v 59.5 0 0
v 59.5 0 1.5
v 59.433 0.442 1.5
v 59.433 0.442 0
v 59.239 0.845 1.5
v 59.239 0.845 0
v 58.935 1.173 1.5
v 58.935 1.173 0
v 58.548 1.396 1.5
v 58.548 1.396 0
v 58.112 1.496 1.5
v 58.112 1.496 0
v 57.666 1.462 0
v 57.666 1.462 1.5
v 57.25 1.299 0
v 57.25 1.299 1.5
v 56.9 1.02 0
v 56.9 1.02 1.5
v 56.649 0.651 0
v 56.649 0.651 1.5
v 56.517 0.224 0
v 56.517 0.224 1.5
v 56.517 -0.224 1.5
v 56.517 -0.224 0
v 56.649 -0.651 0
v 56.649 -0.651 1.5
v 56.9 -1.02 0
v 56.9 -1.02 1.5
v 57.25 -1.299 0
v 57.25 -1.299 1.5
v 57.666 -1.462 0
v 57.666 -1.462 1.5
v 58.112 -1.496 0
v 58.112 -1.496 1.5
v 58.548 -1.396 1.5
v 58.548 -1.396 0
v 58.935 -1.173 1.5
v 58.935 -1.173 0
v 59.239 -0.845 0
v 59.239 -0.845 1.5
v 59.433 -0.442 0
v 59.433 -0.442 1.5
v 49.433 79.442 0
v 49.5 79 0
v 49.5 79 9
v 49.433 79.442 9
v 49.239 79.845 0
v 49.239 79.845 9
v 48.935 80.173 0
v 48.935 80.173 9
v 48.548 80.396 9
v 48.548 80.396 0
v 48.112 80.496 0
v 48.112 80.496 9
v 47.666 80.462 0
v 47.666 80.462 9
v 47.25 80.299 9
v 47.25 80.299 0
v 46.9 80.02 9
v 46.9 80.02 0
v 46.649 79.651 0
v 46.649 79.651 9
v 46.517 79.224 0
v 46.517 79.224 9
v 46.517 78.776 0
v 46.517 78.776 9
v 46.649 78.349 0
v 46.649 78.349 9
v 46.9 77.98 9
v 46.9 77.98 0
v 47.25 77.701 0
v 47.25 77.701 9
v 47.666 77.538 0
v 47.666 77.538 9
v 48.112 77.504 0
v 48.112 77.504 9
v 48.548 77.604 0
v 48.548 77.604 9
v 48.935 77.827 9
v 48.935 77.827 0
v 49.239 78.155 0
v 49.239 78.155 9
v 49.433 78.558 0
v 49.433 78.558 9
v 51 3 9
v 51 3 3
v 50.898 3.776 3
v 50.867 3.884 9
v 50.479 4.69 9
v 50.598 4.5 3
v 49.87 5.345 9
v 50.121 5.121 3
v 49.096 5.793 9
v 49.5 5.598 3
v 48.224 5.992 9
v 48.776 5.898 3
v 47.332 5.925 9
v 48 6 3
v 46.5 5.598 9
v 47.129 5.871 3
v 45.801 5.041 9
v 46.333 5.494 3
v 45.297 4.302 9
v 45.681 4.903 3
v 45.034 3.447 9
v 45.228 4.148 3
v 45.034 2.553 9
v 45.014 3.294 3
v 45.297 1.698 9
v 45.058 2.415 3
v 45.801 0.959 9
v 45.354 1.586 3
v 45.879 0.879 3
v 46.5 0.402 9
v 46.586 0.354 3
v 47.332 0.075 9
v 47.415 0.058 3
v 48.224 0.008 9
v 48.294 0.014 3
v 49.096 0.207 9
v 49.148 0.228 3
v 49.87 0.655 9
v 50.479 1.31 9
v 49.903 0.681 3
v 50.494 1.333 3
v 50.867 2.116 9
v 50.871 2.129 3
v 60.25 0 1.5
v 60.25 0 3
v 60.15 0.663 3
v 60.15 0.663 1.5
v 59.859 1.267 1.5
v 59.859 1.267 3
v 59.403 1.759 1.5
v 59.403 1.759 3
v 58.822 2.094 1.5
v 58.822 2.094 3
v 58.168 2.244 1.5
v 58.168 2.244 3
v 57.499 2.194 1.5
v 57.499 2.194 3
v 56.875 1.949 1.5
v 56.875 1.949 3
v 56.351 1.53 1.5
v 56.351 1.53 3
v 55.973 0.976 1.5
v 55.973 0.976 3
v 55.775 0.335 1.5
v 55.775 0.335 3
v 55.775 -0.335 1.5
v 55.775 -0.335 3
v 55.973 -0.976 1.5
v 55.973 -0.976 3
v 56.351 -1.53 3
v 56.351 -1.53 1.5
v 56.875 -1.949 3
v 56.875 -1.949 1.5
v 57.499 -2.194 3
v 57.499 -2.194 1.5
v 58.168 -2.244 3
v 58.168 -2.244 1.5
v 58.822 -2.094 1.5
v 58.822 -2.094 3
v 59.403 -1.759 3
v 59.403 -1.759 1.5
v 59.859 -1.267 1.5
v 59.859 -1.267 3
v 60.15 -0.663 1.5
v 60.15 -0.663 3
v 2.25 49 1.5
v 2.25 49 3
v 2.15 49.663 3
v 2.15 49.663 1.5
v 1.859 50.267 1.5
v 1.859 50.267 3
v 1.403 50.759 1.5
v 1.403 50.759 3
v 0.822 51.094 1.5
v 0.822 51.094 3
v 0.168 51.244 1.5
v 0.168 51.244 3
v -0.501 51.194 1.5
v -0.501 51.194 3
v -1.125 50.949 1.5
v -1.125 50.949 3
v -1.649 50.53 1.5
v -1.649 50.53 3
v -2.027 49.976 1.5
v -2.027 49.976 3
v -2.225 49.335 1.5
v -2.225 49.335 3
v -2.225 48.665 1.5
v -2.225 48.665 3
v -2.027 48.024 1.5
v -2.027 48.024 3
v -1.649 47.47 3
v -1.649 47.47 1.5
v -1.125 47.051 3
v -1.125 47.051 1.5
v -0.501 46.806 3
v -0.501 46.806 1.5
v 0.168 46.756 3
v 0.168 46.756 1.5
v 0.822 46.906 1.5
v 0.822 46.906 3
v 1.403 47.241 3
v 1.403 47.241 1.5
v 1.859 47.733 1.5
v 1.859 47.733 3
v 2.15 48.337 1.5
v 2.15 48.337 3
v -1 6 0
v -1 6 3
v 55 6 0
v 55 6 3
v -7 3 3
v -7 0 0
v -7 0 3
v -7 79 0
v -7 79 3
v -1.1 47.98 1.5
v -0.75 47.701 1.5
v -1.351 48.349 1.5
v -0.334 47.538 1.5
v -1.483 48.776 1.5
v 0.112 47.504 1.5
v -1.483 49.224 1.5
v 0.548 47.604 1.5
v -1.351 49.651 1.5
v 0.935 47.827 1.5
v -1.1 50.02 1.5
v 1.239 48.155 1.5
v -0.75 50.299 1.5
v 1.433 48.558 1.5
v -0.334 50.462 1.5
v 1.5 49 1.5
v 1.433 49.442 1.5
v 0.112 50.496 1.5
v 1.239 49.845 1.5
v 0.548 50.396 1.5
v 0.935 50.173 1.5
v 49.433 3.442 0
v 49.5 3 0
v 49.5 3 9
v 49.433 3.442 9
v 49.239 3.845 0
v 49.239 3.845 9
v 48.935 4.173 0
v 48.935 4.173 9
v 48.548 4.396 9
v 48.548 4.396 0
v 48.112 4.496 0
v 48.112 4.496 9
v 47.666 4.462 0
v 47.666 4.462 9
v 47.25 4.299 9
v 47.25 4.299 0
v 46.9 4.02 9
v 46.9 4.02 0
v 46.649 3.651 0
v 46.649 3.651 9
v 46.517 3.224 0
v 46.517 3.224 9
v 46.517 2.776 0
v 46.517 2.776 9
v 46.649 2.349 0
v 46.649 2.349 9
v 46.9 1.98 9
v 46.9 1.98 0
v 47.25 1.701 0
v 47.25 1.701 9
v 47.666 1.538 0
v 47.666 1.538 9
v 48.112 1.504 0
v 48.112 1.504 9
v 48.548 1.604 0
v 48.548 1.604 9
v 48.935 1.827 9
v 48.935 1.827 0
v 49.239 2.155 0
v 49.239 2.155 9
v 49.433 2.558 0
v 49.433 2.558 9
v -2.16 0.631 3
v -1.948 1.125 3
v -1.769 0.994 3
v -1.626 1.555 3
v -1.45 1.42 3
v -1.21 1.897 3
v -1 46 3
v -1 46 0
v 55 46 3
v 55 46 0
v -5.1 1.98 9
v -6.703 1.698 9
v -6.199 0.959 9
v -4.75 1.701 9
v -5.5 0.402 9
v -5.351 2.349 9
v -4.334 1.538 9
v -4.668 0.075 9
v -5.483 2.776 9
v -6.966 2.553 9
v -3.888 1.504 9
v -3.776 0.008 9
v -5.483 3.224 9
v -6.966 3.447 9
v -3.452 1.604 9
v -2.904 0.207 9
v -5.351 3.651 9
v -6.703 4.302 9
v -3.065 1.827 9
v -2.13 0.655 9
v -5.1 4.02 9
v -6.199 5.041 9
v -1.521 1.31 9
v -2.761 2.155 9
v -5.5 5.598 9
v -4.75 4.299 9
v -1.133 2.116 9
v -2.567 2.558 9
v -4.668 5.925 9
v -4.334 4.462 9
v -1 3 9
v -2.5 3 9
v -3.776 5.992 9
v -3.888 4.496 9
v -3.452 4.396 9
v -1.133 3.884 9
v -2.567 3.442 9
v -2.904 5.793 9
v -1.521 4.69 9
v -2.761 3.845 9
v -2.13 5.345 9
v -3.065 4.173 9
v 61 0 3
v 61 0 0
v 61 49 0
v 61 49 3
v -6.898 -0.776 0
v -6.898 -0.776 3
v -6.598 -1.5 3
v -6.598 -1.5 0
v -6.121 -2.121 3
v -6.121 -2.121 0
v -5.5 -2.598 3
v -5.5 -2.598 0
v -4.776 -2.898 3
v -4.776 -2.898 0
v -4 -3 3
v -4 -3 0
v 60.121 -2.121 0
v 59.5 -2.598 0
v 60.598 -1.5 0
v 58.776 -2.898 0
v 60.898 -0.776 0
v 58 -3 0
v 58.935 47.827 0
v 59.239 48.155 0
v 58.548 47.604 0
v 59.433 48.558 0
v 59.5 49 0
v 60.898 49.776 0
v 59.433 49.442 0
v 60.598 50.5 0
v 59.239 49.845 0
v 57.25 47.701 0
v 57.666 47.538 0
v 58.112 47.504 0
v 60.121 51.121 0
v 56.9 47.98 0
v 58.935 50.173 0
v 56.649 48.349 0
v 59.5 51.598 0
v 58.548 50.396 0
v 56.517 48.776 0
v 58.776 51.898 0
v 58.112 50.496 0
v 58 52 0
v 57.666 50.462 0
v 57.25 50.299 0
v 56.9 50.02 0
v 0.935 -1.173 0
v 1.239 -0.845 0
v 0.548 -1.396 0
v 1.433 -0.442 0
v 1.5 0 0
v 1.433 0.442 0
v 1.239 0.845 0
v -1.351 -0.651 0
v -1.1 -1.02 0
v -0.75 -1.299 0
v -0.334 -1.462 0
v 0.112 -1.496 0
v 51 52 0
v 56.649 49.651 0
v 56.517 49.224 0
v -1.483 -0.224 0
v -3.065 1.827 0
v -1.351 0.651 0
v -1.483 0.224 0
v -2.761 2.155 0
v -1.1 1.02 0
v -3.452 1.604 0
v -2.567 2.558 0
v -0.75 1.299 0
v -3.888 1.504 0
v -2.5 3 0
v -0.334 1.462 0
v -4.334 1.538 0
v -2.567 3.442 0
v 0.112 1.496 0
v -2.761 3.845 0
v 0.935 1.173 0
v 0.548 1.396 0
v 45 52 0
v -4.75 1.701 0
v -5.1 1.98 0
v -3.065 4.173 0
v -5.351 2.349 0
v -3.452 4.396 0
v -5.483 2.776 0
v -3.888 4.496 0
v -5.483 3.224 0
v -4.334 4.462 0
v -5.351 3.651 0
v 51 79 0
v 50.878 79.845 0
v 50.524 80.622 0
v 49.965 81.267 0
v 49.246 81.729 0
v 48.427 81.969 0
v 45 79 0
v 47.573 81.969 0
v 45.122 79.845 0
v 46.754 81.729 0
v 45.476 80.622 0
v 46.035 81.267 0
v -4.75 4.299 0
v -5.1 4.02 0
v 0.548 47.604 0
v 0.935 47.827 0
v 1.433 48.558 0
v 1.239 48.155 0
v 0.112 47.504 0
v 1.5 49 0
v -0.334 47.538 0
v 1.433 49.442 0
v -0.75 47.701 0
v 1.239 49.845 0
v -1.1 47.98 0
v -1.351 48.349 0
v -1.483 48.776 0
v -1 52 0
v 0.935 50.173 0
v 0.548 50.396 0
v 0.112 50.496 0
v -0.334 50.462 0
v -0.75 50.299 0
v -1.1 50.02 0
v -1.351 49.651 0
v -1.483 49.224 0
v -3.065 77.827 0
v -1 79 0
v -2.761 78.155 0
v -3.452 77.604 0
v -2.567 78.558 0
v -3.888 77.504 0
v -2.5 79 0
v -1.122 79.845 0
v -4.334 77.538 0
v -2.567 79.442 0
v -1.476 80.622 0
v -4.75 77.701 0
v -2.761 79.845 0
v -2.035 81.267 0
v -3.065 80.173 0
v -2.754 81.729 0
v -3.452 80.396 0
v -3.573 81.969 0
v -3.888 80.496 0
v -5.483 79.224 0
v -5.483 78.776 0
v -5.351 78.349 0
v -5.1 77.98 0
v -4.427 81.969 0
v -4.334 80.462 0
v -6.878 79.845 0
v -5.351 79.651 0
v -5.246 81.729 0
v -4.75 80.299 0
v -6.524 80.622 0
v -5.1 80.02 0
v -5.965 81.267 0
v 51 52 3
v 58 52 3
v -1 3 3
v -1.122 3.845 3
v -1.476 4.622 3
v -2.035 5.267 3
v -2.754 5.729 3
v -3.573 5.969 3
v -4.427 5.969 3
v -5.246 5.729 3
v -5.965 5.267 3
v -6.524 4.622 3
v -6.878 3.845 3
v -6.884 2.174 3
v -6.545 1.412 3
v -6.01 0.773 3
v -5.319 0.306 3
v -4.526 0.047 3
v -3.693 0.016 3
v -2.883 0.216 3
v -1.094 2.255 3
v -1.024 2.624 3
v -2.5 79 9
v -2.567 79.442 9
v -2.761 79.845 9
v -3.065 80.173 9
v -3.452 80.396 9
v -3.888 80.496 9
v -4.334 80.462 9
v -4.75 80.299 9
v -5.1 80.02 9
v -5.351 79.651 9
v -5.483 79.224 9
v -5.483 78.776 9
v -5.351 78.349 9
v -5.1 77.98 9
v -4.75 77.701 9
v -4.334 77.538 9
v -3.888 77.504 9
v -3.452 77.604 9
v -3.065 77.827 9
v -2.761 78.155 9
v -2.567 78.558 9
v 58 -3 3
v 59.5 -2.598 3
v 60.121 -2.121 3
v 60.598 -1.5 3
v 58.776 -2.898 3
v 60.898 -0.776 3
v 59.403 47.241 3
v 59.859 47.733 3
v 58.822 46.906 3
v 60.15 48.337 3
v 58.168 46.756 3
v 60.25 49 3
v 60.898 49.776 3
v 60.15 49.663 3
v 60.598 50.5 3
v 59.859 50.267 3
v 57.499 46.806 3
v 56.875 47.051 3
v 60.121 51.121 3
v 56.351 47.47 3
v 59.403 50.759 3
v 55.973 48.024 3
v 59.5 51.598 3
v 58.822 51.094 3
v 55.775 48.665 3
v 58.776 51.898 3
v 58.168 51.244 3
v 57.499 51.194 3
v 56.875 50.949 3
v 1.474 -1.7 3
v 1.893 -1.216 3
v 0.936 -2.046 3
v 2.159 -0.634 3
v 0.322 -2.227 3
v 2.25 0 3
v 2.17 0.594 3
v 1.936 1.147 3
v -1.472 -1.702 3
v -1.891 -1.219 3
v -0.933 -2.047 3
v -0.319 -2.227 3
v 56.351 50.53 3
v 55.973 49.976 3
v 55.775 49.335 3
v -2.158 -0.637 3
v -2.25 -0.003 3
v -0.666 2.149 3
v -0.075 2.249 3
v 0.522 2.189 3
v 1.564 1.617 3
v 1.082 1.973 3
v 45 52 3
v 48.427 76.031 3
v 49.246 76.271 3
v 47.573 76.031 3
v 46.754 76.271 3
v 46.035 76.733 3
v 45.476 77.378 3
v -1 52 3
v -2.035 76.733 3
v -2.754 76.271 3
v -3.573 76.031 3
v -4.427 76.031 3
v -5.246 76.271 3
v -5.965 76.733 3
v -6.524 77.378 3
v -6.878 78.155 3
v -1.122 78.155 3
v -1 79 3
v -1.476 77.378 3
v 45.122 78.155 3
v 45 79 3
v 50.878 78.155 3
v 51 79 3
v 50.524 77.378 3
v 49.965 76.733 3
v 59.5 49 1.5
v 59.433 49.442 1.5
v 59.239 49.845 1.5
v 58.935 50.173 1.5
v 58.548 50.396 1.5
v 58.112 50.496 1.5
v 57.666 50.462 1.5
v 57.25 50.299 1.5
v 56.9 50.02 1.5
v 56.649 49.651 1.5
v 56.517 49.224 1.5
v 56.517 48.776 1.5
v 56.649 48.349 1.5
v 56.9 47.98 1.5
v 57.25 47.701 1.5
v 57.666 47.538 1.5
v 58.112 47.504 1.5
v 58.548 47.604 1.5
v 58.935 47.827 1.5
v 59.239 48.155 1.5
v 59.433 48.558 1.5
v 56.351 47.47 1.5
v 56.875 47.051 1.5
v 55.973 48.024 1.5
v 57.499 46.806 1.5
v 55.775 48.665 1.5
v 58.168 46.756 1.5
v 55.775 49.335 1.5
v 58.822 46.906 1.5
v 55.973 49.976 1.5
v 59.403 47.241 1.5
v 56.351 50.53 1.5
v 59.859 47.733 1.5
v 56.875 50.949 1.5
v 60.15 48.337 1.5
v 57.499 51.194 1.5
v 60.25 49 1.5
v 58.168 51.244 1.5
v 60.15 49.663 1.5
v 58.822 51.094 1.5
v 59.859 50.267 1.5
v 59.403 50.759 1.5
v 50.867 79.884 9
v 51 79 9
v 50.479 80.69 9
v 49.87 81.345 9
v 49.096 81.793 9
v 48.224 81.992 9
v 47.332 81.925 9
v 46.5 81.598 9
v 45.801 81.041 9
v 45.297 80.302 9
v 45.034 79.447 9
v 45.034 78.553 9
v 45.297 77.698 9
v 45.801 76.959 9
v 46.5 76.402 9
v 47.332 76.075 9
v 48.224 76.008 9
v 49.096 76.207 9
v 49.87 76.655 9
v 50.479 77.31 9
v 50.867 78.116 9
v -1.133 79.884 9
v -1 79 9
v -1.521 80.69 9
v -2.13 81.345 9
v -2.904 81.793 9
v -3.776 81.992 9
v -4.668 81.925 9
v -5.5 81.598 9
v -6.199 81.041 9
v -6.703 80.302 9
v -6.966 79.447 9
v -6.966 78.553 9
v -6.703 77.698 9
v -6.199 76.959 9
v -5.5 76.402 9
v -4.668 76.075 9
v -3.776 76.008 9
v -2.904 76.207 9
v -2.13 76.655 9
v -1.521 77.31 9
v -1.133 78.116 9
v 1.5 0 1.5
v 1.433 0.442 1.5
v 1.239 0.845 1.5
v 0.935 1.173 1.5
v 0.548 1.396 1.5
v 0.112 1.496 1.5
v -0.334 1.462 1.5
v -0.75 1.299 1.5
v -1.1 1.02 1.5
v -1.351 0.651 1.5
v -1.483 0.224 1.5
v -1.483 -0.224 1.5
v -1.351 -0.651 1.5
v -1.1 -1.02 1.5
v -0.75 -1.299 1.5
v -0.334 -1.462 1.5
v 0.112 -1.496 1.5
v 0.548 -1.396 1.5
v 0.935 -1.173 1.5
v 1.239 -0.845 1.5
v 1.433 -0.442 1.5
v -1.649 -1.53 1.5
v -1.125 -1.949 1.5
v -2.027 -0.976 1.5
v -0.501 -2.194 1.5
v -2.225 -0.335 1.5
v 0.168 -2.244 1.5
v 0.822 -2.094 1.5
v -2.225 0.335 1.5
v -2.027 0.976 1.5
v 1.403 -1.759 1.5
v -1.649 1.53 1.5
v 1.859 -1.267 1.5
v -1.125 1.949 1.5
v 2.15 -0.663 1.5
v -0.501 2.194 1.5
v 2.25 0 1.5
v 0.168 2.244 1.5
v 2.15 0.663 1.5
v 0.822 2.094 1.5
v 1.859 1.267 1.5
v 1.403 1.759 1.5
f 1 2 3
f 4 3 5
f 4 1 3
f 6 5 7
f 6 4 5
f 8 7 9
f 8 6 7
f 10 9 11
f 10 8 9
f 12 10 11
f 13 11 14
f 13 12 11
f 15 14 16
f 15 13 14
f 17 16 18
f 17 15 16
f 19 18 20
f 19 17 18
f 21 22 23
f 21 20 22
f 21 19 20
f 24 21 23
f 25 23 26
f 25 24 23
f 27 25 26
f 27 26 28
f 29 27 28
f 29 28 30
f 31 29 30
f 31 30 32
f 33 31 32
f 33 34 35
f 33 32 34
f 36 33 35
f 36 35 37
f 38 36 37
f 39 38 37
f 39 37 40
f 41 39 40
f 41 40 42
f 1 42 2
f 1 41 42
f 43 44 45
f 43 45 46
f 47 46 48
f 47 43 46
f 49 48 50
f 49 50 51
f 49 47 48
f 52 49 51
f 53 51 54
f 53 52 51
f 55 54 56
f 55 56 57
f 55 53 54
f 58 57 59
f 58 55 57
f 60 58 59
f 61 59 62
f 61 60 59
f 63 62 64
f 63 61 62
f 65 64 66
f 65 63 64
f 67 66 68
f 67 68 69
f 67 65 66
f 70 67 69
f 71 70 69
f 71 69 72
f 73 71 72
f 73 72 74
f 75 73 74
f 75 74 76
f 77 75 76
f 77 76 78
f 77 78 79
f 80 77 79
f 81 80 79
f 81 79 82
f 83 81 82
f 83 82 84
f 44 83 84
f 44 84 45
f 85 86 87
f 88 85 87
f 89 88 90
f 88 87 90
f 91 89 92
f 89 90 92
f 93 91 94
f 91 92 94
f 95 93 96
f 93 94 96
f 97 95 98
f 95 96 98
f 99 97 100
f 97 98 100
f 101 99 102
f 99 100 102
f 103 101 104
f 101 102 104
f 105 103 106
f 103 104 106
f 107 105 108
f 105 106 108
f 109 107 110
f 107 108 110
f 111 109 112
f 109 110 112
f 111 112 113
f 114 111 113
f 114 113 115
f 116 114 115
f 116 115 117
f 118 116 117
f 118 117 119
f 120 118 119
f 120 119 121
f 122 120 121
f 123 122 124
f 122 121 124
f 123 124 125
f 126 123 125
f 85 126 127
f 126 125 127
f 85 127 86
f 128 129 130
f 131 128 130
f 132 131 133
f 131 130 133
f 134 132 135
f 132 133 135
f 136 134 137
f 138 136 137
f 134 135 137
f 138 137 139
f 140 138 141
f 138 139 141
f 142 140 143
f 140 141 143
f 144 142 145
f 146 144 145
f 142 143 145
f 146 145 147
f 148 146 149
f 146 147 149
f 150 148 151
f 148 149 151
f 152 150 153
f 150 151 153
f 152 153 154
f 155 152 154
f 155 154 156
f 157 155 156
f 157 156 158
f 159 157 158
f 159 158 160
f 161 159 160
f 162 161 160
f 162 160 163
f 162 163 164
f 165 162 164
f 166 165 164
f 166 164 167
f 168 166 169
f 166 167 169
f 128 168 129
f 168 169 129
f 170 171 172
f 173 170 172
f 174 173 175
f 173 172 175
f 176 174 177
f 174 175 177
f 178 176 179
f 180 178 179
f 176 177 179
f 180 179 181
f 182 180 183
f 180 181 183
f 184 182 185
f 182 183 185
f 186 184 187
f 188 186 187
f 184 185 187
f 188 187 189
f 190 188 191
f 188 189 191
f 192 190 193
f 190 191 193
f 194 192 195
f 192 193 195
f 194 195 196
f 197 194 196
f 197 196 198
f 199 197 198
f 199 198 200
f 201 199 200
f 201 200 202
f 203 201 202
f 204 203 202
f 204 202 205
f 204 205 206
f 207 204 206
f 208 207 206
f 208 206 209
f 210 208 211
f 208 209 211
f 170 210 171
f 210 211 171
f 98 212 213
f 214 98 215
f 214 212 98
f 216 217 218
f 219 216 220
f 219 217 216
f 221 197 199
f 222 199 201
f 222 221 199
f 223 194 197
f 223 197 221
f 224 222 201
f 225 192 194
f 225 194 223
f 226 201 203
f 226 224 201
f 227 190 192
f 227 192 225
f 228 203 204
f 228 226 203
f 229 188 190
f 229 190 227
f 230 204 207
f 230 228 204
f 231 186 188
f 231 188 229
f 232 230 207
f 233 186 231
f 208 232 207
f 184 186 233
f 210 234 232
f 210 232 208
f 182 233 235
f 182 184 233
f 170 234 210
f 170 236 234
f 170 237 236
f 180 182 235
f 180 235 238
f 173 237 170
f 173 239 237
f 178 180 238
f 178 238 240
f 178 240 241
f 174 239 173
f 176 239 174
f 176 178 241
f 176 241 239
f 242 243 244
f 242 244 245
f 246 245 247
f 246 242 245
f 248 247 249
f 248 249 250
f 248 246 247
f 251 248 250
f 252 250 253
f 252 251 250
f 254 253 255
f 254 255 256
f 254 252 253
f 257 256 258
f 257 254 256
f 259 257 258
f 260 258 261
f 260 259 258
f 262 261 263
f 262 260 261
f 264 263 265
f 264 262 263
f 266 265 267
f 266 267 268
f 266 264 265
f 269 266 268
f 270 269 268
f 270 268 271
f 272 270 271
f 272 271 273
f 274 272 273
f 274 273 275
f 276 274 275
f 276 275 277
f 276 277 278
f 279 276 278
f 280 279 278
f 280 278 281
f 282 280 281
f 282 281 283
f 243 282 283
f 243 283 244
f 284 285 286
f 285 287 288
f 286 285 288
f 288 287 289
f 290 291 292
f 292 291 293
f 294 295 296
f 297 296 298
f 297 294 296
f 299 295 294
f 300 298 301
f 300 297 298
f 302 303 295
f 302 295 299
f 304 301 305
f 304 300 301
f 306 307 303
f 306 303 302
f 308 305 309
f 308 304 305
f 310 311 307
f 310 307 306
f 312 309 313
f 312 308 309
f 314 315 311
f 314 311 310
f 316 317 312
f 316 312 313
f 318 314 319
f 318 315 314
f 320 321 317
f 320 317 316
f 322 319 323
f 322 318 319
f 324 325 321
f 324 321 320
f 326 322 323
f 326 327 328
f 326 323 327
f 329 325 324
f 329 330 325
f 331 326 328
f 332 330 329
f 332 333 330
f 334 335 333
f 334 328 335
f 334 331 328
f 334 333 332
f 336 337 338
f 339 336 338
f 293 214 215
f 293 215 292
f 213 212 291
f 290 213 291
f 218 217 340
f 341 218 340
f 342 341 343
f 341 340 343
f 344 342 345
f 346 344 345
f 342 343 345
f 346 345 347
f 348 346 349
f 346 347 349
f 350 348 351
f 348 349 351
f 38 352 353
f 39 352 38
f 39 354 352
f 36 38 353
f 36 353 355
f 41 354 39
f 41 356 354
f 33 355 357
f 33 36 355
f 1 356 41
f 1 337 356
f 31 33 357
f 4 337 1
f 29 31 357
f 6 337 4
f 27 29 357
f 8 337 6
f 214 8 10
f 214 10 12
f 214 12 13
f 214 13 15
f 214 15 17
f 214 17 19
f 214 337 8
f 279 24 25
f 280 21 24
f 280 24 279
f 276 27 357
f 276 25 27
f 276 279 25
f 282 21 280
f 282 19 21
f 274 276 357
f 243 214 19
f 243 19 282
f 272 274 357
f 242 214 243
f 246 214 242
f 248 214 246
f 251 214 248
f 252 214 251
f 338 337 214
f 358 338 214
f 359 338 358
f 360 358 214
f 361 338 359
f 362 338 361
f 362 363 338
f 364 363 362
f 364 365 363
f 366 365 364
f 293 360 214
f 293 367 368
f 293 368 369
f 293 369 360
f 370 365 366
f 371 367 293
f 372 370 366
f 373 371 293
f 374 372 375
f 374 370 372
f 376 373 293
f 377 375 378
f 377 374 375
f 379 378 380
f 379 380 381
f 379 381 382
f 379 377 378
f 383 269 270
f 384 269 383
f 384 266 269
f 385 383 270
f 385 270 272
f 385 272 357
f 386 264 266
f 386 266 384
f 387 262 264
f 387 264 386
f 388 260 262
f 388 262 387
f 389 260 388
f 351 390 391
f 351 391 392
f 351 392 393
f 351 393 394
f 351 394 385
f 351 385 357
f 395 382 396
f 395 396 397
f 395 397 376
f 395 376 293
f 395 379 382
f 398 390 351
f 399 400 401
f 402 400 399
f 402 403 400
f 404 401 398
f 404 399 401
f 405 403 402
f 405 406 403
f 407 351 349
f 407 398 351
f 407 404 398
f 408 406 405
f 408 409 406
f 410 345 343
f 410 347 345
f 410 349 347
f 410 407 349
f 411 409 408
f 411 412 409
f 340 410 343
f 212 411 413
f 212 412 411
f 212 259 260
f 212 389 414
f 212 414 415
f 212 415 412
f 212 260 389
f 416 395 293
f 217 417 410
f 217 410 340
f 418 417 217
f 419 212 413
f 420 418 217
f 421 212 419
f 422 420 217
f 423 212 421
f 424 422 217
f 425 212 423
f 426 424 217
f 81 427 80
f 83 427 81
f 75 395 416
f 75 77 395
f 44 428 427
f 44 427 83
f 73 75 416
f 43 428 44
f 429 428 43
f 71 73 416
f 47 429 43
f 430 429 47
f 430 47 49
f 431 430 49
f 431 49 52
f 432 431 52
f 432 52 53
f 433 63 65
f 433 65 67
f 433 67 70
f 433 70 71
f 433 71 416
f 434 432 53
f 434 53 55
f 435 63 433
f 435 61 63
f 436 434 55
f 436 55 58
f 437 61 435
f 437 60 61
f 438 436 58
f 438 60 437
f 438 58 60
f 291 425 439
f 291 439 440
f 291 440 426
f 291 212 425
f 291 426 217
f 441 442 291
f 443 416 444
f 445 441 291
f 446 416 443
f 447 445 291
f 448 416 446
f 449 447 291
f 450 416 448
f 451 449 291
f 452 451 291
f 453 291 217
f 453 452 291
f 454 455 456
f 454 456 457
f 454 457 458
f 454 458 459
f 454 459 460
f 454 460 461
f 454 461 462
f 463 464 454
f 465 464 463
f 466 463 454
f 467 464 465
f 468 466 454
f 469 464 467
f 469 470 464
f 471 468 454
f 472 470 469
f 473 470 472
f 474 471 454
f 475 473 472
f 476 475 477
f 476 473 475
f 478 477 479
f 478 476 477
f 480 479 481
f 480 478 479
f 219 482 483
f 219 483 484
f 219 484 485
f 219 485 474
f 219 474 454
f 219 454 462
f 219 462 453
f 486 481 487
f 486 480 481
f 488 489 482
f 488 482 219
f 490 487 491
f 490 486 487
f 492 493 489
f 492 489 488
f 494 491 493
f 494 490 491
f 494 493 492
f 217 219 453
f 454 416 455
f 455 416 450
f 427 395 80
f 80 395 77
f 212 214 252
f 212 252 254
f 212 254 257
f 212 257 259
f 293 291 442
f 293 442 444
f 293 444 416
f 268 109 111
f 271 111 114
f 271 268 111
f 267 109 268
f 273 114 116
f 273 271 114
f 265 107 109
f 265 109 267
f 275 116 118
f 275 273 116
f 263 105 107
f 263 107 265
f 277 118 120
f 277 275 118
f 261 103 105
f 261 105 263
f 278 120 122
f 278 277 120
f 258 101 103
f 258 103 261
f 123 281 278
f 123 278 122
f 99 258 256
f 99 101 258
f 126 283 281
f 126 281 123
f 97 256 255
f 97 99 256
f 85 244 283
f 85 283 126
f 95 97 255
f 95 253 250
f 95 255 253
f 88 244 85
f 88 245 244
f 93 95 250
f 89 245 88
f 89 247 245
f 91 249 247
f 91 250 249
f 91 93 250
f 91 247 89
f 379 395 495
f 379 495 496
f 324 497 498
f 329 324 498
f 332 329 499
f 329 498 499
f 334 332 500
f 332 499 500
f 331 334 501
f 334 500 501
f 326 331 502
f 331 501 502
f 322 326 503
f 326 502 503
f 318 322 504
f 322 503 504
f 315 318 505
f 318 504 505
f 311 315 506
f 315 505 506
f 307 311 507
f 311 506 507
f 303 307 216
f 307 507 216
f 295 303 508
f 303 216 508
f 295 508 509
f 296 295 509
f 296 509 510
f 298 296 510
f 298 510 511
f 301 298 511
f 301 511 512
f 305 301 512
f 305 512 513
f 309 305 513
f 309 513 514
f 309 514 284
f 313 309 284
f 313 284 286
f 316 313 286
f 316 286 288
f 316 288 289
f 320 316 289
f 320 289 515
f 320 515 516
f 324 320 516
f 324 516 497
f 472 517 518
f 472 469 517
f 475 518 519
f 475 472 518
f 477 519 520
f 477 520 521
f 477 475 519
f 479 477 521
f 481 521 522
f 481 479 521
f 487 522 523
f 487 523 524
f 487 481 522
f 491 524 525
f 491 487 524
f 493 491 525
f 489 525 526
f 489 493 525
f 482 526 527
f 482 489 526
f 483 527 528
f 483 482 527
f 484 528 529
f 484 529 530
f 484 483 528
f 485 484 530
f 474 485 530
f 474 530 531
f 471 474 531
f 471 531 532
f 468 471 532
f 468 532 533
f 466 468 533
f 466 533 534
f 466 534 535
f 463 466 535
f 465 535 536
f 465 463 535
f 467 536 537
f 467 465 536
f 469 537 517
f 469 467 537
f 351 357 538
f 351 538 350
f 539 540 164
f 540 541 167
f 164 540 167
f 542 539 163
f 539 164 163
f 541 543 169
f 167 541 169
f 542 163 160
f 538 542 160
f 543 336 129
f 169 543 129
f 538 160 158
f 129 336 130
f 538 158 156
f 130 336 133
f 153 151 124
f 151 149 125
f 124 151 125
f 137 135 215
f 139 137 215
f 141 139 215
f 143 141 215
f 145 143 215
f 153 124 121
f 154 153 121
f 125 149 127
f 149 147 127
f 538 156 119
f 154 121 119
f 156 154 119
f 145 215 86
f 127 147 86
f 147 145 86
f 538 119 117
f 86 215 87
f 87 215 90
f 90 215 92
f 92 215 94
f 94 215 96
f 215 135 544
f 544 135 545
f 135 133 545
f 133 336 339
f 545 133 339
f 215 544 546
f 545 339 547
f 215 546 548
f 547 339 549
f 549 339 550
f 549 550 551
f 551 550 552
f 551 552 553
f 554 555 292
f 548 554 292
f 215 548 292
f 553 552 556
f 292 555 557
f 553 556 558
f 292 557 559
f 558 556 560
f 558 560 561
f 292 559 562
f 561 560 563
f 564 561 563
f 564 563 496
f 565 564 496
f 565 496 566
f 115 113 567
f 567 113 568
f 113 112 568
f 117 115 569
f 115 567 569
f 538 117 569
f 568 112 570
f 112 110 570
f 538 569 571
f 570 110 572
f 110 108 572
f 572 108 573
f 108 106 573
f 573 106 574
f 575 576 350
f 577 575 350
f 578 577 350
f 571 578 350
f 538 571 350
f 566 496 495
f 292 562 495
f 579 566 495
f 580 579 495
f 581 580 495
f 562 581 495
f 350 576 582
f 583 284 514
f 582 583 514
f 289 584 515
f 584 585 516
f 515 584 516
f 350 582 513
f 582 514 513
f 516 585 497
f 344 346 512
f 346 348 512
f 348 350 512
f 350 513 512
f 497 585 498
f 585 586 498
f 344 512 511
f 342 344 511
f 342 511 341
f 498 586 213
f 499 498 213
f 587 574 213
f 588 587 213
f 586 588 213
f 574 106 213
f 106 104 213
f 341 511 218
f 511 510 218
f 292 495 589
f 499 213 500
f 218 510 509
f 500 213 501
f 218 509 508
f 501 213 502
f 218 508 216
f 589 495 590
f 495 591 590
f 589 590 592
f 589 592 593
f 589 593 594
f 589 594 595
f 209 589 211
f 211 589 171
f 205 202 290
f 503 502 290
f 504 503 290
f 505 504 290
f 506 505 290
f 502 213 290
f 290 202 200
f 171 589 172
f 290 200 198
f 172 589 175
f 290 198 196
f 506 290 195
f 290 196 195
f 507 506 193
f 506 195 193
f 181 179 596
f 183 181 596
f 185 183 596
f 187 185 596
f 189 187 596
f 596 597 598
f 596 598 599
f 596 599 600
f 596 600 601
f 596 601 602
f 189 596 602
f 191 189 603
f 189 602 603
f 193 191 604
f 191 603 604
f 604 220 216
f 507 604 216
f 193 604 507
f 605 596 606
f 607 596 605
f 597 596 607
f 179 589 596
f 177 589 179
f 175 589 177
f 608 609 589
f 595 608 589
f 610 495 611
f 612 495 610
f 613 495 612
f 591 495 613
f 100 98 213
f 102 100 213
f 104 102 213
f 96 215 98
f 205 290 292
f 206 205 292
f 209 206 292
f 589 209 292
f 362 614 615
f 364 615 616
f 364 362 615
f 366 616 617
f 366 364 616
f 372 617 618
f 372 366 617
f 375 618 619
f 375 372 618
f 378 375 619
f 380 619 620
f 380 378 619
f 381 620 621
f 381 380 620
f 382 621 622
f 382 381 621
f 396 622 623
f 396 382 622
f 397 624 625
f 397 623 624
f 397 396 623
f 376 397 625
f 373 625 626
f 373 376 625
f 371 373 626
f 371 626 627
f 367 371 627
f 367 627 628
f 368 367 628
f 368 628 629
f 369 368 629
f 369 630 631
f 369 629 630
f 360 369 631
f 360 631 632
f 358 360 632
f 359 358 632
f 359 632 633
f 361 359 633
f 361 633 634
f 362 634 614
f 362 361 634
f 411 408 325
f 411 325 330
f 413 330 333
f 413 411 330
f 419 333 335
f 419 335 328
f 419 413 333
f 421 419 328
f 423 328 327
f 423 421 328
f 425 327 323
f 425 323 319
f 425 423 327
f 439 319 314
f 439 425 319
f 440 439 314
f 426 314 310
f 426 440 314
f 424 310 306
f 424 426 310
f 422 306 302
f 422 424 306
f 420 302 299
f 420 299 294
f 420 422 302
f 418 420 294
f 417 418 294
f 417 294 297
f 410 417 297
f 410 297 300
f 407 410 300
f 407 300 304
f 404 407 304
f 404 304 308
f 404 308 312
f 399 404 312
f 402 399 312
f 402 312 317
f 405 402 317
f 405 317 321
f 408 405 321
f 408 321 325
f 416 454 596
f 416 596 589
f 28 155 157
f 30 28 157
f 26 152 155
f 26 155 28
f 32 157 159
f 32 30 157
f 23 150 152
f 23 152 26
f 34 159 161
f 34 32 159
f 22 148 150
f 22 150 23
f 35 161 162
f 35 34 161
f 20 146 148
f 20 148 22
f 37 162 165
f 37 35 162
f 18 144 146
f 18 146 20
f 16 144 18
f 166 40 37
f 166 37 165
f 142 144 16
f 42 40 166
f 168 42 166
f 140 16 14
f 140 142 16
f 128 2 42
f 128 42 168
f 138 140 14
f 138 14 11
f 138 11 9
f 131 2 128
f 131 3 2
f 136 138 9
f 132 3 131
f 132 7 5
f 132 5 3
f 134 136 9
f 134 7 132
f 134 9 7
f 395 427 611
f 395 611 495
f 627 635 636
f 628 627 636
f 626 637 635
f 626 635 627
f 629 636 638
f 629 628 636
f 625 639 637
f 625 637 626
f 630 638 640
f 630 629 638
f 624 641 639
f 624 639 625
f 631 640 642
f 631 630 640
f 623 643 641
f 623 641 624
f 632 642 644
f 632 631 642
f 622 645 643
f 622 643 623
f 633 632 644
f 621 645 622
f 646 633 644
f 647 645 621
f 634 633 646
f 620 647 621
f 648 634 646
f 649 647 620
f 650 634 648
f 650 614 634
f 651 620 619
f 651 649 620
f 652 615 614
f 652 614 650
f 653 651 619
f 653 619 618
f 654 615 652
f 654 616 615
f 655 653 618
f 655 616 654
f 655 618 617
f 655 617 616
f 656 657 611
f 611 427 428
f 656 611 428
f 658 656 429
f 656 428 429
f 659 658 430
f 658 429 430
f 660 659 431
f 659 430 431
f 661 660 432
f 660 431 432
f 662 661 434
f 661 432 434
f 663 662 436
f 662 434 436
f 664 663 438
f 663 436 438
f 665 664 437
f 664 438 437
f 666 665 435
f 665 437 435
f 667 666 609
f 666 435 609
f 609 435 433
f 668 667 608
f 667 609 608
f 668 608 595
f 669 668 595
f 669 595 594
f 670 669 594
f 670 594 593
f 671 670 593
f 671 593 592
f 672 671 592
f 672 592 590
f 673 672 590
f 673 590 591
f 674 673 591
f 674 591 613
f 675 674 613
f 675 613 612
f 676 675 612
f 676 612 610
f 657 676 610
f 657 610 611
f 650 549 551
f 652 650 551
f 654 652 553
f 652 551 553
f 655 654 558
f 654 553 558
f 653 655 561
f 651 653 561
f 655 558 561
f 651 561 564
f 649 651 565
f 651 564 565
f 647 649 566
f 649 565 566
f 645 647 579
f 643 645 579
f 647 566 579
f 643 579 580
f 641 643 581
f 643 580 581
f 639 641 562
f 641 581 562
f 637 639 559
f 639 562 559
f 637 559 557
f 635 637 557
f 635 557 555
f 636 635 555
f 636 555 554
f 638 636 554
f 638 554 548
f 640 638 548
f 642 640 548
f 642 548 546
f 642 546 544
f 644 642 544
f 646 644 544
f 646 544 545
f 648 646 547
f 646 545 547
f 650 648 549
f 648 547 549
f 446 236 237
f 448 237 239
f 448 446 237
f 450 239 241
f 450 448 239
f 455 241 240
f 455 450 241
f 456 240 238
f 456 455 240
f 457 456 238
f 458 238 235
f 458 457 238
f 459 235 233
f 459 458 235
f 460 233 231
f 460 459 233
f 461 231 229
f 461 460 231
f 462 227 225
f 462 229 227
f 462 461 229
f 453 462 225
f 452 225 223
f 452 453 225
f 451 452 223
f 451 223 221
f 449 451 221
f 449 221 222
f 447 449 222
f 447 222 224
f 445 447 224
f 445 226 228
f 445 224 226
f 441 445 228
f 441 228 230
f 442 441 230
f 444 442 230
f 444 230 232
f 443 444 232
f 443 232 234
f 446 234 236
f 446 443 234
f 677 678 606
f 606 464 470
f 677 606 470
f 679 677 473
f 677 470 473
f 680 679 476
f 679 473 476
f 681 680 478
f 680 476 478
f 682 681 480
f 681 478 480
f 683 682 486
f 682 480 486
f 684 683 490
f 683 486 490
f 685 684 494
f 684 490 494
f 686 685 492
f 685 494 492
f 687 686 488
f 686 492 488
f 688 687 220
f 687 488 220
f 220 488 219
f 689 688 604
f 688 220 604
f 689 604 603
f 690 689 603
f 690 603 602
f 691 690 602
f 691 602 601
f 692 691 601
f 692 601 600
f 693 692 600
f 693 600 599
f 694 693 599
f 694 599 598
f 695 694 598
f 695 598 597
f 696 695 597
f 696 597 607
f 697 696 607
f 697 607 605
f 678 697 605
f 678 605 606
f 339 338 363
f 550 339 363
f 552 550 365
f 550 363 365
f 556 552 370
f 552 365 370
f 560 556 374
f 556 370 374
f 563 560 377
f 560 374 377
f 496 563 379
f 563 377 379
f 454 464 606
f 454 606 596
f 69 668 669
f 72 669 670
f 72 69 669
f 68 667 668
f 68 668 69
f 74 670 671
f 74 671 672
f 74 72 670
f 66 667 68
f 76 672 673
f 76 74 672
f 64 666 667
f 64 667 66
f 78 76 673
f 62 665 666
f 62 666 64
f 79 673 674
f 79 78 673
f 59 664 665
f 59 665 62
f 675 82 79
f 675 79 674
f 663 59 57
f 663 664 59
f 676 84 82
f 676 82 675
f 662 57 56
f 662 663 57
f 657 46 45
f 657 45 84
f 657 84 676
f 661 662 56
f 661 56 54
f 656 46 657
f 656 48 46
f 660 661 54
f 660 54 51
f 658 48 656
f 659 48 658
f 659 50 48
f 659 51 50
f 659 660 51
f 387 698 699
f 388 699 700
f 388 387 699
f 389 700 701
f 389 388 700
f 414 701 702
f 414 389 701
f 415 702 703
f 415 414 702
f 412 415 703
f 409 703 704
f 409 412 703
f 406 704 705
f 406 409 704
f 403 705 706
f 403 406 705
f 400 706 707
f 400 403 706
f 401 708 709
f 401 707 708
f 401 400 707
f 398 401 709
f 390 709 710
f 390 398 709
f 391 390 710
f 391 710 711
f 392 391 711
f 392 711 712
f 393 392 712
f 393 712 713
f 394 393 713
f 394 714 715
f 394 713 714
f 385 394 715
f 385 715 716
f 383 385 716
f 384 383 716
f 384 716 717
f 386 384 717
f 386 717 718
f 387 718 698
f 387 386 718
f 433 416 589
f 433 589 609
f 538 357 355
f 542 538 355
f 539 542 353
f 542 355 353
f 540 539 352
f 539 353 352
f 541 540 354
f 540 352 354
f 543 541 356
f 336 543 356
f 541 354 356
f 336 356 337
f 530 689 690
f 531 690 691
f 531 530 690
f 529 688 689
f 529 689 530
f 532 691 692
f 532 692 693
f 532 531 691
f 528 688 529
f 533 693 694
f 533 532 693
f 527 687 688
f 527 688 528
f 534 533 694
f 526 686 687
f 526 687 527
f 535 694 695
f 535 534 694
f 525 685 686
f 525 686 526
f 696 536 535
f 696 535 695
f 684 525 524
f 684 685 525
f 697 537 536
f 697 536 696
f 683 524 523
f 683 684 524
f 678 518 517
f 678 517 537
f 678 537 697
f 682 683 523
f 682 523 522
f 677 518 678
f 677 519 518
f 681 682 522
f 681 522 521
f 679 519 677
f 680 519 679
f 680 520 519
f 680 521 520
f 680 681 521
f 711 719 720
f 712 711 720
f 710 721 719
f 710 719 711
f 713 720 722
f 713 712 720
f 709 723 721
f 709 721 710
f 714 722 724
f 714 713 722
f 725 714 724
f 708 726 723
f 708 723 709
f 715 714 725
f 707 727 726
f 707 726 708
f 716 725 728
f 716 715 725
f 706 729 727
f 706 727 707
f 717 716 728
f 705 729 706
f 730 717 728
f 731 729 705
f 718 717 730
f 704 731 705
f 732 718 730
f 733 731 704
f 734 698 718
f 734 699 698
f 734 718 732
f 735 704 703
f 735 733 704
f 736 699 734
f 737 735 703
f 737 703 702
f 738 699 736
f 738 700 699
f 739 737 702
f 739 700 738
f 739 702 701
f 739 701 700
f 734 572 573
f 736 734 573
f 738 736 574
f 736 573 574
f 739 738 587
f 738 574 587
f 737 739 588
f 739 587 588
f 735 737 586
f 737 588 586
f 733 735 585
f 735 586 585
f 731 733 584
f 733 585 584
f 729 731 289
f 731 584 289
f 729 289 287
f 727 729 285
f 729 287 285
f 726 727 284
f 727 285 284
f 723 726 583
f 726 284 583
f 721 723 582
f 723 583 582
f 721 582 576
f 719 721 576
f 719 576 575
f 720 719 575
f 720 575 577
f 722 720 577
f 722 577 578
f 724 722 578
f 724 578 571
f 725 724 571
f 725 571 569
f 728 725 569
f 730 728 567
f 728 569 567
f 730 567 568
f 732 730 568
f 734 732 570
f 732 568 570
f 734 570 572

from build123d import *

# Parameters (mm, degrees)
SKETCH_R      = 1.5
SKETCH_W      = 56
SKETCH_H      = 40
PAD_DEPTH     = 3
SKETCH001_R   = 3
SKETCH001_R_2 = 1.5
PAD001_DEPTH  = 6
SKETCH002_R   = 2.25
POCKET_DEPTH  = 1.5


with BuildPart() as part:
    # Sketch → Pad (new body)
    with BuildSketch(Plane.XY):
        with BuildLine():
            Line((58, -3), (-4, -3))
            ThreePointArc((-7, 0), (-6.12132, -2.12132), (-4, -3))
            Line((-7, 0), (-7, 79))
            ThreePointArc((-1, 79), (-4, 82), (-7, 79))
            Line((-1, 79), (-1, 52))
            Line((-1, 52), (45, 52))
            Line((45, 52), (45, 79))
            ThreePointArc((51, 79), (48, 82), (45, 79))
            Line((51, 79), (51, 52))
            Line((51, 52), (58, 52))
            ThreePointArc((61, 49), (60.12132, 51.12132), (58, 52))
            Line((61, 0), (61, 49))
            ThreePointArc((58, -3), (60.12132, -2.12132), (61, 0))
        make_face()
        Circle(SKETCH_R, mode=Mode.SUBTRACT)
        with Locations((58, 0)):
            Circle(SKETCH_R, mode=Mode.SUBTRACT)
        with Locations((0, 49)):
            Circle(SKETCH_R, mode=Mode.SUBTRACT)
        with Locations((58, 49)):
            Circle(SKETCH_R, mode=Mode.SUBTRACT)
        with Locations((-4, 3)):
            Circle(SKETCH_R, mode=Mode.SUBTRACT)
        with Locations((48, 3)):
            Circle(SKETCH_R, mode=Mode.SUBTRACT)
        with Locations((48, 79)):
            Circle(SKETCH_R, mode=Mode.SUBTRACT)
        with Locations((-4, 79)):
            Circle(SKETCH_R, mode=Mode.SUBTRACT)
        with Locations((27, 26)):
            Rectangle(SKETCH_W, SKETCH_H, mode=Mode.SUBTRACT)
    extrude(amount=PAD_DEPTH)

    # Sketch001 (on Face27 of Pad) → Pad001 (join)
    with BuildSketch(Plane.XY.offset(3)):
        with Locations((-4, 79)):
            Circle(SKETCH001_R)
        with Locations((-4, 79)):
            Circle(SKETCH001_R_2, mode=Mode.SUBTRACT)
        with Locations((48, 79)):
            Circle(SKETCH001_R)
        with Locations((48, 79)):
            Circle(SKETCH001_R_2, mode=Mode.SUBTRACT)
        with Locations((48, 3)):
            Circle(SKETCH001_R)
        with Locations((48, 3)):
            Circle(SKETCH001_R_2, mode=Mode.SUBTRACT)
        with Locations((-4, 3)):
            Circle(SKETCH001_R)
        with Locations((-4, 3)):
            Circle(SKETCH001_R_2, mode=Mode.SUBTRACT)
    extrude(amount=PAD001_DEPTH)

    # Sketch002 (on Face5 of Pad001) → Pocket (cut)
    with BuildSketch(Plane.XY.offset(3)):
        Circle(SKETCH002_R)
        with Locations((58, 0)):
            Circle(SKETCH002_R)
        with Locations((58, 49)):
            Circle(SKETCH002_R)
        with Locations((0, 49)):
            Circle(SKETCH002_R)
    extrude(amount=-POCKET_DEPTH, mode=Mode.SUBTRACT)


solid = part.part
